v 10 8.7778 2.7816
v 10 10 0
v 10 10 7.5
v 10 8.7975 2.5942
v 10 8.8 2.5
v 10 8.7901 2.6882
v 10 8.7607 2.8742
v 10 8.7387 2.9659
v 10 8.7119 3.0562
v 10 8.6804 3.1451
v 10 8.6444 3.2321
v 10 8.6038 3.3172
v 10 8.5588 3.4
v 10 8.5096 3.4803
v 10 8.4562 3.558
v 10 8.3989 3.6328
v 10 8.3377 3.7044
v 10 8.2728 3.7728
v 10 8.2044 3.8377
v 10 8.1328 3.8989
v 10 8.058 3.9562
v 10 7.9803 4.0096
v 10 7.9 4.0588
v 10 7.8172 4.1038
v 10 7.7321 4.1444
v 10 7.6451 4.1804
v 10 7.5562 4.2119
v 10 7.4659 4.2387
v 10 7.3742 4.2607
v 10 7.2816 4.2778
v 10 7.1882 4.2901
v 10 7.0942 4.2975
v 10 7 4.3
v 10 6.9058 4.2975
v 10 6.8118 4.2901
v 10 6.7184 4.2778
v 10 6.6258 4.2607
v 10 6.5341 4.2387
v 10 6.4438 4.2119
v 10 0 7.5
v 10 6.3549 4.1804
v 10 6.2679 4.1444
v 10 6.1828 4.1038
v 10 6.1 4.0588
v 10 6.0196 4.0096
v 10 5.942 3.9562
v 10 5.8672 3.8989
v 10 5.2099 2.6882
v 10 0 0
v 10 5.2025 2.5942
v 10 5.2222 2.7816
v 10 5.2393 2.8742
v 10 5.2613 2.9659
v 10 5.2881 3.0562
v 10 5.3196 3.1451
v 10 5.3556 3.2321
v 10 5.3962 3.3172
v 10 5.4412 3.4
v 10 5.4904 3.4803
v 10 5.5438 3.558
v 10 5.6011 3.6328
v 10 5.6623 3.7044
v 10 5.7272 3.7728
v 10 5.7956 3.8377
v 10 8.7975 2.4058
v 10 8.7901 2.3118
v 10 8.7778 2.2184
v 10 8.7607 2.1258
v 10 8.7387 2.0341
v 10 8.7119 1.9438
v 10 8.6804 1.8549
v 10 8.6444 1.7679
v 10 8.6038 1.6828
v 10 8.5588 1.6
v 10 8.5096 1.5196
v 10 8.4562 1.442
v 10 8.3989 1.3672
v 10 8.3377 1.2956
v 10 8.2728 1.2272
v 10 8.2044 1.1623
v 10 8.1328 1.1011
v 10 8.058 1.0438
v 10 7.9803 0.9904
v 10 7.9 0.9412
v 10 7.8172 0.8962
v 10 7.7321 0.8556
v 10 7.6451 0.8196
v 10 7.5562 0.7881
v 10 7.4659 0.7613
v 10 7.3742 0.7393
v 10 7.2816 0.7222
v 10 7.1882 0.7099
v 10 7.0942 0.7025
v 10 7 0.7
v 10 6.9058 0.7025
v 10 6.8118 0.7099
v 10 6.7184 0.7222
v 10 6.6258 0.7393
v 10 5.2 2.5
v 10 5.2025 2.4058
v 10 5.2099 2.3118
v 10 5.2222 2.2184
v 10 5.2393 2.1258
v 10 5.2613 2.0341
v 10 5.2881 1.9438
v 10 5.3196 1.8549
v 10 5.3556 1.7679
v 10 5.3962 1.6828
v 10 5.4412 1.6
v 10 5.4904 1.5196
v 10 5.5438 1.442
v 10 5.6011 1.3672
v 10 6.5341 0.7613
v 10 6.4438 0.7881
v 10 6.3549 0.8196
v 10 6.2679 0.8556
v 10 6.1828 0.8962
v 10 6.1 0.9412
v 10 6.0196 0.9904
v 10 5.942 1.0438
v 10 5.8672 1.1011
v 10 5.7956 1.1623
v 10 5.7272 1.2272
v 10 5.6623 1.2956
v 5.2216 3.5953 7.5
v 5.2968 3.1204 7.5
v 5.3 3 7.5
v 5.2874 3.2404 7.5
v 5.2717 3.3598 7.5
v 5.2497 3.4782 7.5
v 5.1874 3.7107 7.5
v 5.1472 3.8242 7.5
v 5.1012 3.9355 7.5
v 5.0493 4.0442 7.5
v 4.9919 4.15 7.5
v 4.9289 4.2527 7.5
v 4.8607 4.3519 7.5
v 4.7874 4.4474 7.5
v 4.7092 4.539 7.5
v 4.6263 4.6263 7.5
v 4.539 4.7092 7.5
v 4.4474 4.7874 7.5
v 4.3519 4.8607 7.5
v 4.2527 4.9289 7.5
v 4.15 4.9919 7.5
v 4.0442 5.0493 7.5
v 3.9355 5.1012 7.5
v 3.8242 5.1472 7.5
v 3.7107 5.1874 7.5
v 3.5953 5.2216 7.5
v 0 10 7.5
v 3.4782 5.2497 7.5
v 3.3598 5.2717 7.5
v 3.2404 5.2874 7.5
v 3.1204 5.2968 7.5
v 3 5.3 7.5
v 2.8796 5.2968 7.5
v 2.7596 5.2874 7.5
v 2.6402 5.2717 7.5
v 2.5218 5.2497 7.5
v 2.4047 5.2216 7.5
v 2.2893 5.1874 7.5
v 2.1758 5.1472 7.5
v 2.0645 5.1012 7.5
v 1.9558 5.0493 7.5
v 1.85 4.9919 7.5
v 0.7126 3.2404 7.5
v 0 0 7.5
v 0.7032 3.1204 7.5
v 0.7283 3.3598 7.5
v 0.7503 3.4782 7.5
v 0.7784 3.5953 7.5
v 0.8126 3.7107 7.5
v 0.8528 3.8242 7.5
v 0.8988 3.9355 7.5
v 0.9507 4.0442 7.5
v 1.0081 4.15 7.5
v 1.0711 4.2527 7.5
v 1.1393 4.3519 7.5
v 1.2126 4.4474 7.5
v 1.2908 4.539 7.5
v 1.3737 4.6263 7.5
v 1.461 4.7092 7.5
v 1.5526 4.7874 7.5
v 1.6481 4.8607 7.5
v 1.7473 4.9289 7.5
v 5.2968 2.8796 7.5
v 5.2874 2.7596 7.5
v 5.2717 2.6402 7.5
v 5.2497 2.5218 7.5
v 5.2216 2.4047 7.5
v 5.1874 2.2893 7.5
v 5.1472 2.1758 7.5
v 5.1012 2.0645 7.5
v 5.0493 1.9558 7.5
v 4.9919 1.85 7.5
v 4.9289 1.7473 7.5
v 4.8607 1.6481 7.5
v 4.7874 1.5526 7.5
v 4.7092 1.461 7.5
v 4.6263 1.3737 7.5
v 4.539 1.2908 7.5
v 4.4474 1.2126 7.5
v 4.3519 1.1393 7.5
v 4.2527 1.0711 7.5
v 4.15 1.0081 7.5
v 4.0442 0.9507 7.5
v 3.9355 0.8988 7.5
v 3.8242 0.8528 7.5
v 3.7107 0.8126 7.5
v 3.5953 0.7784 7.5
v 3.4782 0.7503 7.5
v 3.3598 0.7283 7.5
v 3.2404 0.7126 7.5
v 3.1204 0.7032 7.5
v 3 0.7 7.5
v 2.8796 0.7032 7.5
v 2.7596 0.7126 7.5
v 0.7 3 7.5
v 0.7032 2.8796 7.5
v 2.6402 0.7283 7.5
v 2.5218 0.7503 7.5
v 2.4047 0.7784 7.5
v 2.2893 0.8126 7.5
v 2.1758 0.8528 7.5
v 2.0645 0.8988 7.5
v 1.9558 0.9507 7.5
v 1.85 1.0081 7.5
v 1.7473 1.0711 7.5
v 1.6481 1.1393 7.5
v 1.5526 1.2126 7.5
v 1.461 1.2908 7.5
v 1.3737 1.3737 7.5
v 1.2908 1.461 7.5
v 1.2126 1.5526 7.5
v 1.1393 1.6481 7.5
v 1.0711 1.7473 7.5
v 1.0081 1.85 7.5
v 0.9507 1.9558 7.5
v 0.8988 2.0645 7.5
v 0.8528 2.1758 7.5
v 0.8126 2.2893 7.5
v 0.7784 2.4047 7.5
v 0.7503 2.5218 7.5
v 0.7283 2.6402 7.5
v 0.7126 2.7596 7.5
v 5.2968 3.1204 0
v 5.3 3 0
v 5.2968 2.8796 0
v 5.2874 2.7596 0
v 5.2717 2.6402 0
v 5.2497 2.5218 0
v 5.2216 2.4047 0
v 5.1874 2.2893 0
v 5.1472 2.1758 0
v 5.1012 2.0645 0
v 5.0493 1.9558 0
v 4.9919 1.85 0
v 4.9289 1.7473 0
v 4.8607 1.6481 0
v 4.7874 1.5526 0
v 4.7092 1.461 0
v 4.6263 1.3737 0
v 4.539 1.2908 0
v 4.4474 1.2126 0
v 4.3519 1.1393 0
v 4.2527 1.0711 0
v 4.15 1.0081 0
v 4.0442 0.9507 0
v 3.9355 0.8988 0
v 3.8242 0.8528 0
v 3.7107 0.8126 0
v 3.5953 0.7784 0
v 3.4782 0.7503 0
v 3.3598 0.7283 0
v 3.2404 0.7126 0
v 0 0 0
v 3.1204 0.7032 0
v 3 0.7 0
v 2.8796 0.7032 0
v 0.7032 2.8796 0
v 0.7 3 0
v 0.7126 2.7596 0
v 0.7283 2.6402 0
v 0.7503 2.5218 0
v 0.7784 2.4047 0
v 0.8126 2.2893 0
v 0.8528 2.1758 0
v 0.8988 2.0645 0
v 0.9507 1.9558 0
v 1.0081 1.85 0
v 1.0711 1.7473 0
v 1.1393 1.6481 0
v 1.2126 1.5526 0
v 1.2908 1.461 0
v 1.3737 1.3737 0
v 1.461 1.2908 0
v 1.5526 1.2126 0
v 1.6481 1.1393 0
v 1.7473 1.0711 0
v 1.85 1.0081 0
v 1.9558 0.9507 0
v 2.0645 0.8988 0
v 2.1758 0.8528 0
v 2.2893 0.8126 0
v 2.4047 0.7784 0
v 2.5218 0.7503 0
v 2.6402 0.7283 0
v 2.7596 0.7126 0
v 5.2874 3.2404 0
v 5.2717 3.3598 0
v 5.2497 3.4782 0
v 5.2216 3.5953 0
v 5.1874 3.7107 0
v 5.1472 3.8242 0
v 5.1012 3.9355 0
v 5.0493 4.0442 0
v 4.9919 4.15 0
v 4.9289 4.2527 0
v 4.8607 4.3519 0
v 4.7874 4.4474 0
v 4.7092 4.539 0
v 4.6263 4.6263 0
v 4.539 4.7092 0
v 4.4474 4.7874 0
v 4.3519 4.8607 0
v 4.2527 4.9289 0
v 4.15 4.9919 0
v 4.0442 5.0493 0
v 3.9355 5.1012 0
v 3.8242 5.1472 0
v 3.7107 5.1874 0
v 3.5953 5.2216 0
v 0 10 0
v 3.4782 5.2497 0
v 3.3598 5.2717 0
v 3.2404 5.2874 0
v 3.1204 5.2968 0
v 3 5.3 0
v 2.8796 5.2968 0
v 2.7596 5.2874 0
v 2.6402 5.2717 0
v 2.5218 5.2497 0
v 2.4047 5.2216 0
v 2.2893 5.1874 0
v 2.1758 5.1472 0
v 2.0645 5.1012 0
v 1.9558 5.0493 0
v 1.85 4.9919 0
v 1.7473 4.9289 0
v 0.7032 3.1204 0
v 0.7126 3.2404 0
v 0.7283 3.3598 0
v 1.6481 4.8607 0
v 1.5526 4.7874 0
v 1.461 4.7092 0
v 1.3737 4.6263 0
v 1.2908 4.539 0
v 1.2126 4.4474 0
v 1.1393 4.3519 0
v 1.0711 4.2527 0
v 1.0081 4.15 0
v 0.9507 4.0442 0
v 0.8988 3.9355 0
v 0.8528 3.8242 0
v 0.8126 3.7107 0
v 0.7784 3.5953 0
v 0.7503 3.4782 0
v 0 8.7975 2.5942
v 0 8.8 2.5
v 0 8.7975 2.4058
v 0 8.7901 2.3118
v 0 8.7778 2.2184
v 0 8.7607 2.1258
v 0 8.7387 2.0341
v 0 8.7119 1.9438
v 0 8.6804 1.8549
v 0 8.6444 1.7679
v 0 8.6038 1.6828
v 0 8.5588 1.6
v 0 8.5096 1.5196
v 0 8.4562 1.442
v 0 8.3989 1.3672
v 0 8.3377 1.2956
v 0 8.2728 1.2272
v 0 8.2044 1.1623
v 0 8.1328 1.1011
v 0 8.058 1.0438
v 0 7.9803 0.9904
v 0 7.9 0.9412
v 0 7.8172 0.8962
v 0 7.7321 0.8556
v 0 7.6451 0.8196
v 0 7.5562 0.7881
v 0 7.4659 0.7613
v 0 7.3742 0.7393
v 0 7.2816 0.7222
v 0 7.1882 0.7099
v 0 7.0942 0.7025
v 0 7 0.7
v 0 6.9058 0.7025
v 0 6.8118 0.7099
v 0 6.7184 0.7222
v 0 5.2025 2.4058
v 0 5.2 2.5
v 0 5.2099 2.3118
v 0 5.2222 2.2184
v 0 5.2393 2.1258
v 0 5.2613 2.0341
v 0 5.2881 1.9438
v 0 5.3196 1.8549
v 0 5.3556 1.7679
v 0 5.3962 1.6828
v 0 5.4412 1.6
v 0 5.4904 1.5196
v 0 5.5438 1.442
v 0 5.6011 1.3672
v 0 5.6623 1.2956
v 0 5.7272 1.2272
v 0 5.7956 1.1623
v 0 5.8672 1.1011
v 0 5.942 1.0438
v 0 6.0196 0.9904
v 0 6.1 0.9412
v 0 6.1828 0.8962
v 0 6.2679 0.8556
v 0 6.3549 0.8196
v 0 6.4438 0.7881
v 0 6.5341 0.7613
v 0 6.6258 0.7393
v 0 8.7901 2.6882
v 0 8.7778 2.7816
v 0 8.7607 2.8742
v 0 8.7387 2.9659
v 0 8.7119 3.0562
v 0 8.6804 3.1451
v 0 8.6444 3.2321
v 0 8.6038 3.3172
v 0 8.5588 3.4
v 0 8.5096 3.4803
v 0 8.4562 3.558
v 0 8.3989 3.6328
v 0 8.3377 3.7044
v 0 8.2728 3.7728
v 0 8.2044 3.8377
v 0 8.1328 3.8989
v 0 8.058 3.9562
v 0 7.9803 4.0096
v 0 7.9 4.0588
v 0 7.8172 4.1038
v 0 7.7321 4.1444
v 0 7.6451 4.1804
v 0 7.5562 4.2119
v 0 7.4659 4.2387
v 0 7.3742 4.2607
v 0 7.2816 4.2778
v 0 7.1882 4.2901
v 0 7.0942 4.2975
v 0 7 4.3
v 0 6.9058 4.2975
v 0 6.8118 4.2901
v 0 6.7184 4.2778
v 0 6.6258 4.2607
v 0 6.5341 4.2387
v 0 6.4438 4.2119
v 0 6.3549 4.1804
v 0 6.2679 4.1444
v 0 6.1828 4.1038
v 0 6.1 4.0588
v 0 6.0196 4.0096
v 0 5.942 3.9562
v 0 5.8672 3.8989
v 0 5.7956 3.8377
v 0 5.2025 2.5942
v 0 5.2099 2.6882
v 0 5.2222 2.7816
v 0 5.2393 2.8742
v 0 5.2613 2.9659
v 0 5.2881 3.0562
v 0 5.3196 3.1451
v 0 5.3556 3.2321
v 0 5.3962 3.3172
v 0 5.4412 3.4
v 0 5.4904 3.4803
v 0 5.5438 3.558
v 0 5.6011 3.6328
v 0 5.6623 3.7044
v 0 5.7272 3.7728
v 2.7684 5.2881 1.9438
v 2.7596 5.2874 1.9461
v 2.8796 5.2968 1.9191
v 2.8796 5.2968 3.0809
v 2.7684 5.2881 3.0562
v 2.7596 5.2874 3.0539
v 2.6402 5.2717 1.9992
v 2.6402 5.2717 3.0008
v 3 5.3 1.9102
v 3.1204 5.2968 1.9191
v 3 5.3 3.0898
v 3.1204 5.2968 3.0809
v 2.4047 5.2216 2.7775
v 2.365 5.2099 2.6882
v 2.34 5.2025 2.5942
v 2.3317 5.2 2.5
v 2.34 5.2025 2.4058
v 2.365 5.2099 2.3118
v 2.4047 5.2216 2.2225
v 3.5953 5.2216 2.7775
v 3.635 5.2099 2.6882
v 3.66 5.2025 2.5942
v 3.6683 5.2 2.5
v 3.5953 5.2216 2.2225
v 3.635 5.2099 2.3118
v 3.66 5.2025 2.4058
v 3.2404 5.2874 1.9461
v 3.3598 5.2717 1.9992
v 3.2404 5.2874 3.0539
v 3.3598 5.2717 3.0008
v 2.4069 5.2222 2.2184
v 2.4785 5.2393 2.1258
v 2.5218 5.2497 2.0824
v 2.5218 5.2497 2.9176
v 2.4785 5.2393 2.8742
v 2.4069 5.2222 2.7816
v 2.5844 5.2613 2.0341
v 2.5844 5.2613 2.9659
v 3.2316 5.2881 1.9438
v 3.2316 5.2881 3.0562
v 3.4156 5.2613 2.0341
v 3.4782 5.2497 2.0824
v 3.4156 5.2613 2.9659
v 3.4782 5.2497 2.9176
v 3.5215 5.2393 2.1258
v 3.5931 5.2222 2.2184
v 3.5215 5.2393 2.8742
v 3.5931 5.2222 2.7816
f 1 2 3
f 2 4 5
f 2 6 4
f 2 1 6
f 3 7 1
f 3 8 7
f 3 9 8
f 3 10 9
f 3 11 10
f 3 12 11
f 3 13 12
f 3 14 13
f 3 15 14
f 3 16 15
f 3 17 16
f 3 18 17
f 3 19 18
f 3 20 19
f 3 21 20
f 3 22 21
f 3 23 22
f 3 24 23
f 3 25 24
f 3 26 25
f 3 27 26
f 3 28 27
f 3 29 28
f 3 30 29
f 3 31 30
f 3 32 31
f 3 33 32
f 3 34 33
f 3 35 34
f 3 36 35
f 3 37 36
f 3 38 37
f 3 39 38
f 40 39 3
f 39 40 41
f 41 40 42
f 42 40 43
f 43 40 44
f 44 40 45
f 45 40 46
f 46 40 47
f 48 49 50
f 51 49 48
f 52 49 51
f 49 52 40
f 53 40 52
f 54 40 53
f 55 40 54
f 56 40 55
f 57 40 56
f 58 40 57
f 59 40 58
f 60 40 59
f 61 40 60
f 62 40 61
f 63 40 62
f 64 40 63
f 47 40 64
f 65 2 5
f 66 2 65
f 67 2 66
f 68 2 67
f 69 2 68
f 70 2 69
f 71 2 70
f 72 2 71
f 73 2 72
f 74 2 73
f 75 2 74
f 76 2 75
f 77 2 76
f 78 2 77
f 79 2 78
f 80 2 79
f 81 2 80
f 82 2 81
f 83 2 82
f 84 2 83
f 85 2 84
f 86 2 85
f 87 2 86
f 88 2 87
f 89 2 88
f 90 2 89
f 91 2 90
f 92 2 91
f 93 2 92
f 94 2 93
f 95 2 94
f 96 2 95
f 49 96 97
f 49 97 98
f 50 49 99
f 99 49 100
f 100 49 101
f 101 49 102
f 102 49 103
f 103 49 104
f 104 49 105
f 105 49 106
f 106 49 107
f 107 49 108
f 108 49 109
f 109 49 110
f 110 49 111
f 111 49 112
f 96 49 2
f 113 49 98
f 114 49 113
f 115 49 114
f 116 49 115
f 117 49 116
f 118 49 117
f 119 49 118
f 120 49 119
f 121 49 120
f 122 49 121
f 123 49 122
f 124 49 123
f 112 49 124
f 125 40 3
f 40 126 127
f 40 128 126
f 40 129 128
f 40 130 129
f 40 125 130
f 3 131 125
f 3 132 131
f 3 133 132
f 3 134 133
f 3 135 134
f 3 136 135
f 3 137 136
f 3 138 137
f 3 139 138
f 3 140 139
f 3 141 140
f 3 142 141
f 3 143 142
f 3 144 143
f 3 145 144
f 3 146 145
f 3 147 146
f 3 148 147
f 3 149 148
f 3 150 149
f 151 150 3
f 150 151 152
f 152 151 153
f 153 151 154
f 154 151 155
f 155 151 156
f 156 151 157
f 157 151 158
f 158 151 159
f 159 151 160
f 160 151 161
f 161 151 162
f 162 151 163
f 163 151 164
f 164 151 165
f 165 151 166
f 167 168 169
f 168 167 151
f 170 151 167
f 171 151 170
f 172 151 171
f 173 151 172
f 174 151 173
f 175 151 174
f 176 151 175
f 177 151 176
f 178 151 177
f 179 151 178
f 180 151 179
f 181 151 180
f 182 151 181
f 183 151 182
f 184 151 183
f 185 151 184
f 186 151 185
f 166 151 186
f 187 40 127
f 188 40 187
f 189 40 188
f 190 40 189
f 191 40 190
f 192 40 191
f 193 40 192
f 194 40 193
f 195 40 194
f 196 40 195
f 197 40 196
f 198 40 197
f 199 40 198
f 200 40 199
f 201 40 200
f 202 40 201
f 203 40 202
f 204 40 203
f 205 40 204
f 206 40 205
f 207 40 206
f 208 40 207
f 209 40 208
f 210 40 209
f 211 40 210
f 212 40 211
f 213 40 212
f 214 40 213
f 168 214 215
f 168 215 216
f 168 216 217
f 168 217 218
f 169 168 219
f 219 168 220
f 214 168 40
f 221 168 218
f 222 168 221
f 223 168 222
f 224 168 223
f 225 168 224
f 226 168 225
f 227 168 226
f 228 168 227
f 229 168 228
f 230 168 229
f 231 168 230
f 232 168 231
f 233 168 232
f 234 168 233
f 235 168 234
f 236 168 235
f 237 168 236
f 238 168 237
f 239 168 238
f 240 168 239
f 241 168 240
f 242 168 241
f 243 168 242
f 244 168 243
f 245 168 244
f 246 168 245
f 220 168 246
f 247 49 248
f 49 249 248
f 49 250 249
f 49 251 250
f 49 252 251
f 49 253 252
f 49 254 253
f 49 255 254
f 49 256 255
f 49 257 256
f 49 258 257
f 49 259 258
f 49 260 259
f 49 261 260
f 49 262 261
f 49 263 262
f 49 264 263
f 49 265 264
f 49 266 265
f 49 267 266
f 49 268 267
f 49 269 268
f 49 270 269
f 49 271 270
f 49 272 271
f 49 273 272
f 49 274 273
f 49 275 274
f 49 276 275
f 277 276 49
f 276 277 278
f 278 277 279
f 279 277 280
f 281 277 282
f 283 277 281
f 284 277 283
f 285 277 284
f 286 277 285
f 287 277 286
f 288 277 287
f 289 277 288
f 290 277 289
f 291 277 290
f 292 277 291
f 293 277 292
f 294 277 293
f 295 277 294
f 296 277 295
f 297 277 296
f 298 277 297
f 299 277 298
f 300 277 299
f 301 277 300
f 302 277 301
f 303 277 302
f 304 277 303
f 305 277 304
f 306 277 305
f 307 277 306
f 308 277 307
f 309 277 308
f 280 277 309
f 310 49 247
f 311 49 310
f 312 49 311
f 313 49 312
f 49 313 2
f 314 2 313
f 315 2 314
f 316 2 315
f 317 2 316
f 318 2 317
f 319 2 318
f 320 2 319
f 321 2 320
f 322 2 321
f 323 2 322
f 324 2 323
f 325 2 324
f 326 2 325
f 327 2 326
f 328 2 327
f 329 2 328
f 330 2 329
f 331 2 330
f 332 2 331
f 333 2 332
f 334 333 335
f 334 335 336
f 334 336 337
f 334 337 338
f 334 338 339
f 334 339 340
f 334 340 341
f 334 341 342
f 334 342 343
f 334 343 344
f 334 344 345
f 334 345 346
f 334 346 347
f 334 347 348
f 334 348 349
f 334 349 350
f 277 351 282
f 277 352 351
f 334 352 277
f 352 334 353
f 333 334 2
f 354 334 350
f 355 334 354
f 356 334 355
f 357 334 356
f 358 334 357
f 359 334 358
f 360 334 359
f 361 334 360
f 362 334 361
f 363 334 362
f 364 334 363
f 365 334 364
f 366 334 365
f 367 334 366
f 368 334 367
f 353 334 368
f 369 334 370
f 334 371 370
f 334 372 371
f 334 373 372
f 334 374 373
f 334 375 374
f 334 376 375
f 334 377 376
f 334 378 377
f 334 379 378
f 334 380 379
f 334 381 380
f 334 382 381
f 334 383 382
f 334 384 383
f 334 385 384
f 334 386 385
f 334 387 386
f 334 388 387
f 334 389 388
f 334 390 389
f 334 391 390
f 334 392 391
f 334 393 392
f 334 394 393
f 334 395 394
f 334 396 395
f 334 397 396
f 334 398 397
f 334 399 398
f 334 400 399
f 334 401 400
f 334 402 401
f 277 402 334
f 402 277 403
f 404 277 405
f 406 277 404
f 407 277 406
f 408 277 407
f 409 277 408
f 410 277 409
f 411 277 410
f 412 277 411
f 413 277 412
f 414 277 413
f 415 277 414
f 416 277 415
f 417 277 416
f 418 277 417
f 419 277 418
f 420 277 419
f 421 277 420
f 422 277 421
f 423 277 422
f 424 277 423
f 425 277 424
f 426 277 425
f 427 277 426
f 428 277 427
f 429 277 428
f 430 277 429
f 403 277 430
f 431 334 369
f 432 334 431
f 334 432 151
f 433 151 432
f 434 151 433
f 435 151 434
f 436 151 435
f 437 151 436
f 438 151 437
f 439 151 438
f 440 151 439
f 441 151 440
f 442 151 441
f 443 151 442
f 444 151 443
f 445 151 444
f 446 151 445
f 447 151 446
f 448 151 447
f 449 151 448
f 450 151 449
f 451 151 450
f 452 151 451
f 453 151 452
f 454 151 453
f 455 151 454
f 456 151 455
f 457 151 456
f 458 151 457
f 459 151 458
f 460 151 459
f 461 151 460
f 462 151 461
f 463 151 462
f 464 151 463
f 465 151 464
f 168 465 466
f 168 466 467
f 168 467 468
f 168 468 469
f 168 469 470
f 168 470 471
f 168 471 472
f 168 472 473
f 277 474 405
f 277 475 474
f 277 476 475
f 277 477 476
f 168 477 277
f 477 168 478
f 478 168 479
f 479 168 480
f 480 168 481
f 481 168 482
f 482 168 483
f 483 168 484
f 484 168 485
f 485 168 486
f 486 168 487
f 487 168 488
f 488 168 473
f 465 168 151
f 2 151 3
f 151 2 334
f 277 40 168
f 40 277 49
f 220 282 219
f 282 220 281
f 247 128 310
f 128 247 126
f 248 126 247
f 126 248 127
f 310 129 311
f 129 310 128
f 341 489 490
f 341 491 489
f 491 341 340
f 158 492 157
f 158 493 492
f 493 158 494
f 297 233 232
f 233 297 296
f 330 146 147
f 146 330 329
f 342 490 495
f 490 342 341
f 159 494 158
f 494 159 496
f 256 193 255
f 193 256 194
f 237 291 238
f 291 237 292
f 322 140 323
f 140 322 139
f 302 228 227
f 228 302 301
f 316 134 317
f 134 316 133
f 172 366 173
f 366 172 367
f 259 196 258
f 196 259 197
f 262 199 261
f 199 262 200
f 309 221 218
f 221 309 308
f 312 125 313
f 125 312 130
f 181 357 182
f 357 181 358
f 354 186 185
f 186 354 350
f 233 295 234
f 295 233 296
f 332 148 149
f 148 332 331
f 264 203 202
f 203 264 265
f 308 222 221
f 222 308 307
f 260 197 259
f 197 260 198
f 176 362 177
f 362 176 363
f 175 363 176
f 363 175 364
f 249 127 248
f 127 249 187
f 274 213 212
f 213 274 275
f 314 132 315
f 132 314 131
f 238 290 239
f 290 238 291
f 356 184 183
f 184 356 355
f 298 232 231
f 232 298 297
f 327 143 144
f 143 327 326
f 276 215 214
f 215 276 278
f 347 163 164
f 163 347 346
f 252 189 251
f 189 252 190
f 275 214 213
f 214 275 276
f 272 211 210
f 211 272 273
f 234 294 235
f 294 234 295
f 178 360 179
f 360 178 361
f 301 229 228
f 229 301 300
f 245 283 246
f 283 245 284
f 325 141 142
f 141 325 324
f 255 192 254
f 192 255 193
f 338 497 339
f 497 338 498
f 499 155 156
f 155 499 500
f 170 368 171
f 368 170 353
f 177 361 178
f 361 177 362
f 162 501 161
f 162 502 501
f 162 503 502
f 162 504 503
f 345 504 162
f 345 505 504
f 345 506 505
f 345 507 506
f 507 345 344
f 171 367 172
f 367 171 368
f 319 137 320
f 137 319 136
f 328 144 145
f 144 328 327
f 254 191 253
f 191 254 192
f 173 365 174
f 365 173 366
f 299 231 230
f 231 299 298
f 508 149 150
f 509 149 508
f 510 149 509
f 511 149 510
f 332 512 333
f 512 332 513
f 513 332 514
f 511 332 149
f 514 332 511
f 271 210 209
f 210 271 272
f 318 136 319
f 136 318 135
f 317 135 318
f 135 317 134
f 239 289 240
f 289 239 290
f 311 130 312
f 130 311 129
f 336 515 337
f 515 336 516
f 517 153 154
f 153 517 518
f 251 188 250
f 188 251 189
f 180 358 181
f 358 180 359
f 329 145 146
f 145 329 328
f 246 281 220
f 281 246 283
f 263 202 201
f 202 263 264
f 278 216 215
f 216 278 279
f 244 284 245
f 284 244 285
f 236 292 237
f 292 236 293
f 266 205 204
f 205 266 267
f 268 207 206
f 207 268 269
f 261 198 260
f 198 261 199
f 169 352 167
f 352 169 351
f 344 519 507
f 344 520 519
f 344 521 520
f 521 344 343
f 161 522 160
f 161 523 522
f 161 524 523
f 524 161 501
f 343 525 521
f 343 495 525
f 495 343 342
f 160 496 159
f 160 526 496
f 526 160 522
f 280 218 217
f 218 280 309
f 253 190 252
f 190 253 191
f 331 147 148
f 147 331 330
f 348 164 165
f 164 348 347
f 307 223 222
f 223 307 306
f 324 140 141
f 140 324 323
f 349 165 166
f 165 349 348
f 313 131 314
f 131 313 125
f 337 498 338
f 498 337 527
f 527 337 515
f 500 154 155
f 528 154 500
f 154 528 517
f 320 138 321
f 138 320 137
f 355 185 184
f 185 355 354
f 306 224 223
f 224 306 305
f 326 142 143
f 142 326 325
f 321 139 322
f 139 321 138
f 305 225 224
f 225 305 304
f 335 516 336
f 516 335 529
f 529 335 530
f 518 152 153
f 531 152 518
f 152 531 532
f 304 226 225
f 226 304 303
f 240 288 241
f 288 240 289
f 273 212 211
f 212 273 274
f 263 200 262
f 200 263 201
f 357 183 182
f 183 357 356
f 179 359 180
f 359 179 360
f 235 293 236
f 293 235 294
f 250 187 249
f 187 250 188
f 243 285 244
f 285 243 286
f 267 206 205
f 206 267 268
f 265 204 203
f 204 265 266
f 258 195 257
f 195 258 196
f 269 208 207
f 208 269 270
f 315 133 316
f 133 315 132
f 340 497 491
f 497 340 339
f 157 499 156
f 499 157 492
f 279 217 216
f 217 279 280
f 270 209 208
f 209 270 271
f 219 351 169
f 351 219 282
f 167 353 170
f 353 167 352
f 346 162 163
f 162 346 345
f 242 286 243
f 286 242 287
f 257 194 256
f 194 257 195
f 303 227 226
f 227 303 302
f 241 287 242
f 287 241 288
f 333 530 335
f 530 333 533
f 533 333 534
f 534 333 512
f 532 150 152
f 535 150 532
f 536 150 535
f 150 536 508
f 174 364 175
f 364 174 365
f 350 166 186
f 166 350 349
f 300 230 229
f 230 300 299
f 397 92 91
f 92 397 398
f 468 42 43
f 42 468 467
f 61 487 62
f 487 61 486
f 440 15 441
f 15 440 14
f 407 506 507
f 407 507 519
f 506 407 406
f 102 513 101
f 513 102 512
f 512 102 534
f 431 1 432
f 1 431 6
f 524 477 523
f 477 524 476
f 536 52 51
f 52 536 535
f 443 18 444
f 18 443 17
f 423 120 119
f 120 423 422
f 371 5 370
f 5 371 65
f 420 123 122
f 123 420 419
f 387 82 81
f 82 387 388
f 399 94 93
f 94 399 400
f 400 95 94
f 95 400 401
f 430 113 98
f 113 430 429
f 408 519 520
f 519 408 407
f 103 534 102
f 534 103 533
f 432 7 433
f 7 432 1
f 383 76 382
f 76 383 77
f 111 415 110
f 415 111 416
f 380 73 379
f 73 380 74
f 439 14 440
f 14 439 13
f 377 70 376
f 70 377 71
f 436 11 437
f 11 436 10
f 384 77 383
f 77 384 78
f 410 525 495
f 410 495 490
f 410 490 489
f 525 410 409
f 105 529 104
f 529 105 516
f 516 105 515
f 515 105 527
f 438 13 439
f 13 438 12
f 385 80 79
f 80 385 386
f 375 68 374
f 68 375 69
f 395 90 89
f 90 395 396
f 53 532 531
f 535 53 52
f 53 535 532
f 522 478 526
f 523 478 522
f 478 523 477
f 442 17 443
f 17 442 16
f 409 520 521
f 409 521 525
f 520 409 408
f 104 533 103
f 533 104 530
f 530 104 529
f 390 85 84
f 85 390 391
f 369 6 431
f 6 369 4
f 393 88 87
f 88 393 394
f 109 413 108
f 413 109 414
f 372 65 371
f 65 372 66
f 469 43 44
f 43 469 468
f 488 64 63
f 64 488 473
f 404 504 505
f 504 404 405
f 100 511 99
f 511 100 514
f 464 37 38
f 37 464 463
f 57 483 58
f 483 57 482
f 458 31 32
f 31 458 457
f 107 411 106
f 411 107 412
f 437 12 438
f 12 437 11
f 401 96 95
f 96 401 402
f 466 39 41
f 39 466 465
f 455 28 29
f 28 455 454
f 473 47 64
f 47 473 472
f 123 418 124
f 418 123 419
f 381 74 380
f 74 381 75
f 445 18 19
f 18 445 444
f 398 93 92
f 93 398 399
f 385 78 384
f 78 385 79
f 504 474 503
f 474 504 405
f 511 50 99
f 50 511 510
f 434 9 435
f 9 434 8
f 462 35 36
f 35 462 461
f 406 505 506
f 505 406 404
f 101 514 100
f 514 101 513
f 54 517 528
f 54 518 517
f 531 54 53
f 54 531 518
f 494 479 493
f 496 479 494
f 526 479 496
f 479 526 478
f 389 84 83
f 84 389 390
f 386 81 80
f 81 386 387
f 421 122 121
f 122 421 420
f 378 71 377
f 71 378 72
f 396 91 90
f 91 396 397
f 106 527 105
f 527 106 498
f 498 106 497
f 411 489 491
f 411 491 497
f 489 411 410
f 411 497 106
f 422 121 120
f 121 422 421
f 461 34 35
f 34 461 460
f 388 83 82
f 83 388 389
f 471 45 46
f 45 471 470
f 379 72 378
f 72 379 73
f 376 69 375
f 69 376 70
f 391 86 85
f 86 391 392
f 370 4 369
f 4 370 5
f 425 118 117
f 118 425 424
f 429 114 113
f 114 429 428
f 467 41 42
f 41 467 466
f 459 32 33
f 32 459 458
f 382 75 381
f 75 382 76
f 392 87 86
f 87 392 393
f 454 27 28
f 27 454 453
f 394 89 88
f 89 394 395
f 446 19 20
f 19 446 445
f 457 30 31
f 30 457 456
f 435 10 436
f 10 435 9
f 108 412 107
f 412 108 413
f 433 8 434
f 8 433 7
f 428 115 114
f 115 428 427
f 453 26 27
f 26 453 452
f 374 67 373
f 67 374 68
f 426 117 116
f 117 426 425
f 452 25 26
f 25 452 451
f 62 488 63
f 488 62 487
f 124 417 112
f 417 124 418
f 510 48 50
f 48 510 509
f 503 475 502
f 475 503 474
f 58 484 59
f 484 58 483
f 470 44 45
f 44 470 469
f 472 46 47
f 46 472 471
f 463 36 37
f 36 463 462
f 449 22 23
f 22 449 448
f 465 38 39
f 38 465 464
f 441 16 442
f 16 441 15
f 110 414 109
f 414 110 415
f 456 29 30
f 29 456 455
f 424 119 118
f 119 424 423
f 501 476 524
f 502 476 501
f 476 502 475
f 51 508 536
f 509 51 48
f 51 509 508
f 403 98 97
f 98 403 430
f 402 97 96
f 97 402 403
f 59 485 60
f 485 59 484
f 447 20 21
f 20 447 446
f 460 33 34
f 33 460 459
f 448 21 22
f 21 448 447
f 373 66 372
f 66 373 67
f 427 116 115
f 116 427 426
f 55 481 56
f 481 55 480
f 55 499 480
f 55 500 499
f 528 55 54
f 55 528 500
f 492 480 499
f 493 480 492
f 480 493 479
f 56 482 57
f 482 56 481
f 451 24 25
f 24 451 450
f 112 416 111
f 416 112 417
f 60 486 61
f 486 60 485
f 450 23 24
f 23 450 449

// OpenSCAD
// Real Lonely T-Rex Game: T-Rex Carrier
// Copyright (C) 2017, Uri Shaked and Ariella Eliassaf

$fn=120;

difference() {
    cube([10,10,7.5]);
    
    translate([3,3,0])
    cylinder(h=10, r=2.3);
    
    translate([0,7,2.5])
    rotate([0,90,0])
    cylinder(h=10, r=1.8);
}
